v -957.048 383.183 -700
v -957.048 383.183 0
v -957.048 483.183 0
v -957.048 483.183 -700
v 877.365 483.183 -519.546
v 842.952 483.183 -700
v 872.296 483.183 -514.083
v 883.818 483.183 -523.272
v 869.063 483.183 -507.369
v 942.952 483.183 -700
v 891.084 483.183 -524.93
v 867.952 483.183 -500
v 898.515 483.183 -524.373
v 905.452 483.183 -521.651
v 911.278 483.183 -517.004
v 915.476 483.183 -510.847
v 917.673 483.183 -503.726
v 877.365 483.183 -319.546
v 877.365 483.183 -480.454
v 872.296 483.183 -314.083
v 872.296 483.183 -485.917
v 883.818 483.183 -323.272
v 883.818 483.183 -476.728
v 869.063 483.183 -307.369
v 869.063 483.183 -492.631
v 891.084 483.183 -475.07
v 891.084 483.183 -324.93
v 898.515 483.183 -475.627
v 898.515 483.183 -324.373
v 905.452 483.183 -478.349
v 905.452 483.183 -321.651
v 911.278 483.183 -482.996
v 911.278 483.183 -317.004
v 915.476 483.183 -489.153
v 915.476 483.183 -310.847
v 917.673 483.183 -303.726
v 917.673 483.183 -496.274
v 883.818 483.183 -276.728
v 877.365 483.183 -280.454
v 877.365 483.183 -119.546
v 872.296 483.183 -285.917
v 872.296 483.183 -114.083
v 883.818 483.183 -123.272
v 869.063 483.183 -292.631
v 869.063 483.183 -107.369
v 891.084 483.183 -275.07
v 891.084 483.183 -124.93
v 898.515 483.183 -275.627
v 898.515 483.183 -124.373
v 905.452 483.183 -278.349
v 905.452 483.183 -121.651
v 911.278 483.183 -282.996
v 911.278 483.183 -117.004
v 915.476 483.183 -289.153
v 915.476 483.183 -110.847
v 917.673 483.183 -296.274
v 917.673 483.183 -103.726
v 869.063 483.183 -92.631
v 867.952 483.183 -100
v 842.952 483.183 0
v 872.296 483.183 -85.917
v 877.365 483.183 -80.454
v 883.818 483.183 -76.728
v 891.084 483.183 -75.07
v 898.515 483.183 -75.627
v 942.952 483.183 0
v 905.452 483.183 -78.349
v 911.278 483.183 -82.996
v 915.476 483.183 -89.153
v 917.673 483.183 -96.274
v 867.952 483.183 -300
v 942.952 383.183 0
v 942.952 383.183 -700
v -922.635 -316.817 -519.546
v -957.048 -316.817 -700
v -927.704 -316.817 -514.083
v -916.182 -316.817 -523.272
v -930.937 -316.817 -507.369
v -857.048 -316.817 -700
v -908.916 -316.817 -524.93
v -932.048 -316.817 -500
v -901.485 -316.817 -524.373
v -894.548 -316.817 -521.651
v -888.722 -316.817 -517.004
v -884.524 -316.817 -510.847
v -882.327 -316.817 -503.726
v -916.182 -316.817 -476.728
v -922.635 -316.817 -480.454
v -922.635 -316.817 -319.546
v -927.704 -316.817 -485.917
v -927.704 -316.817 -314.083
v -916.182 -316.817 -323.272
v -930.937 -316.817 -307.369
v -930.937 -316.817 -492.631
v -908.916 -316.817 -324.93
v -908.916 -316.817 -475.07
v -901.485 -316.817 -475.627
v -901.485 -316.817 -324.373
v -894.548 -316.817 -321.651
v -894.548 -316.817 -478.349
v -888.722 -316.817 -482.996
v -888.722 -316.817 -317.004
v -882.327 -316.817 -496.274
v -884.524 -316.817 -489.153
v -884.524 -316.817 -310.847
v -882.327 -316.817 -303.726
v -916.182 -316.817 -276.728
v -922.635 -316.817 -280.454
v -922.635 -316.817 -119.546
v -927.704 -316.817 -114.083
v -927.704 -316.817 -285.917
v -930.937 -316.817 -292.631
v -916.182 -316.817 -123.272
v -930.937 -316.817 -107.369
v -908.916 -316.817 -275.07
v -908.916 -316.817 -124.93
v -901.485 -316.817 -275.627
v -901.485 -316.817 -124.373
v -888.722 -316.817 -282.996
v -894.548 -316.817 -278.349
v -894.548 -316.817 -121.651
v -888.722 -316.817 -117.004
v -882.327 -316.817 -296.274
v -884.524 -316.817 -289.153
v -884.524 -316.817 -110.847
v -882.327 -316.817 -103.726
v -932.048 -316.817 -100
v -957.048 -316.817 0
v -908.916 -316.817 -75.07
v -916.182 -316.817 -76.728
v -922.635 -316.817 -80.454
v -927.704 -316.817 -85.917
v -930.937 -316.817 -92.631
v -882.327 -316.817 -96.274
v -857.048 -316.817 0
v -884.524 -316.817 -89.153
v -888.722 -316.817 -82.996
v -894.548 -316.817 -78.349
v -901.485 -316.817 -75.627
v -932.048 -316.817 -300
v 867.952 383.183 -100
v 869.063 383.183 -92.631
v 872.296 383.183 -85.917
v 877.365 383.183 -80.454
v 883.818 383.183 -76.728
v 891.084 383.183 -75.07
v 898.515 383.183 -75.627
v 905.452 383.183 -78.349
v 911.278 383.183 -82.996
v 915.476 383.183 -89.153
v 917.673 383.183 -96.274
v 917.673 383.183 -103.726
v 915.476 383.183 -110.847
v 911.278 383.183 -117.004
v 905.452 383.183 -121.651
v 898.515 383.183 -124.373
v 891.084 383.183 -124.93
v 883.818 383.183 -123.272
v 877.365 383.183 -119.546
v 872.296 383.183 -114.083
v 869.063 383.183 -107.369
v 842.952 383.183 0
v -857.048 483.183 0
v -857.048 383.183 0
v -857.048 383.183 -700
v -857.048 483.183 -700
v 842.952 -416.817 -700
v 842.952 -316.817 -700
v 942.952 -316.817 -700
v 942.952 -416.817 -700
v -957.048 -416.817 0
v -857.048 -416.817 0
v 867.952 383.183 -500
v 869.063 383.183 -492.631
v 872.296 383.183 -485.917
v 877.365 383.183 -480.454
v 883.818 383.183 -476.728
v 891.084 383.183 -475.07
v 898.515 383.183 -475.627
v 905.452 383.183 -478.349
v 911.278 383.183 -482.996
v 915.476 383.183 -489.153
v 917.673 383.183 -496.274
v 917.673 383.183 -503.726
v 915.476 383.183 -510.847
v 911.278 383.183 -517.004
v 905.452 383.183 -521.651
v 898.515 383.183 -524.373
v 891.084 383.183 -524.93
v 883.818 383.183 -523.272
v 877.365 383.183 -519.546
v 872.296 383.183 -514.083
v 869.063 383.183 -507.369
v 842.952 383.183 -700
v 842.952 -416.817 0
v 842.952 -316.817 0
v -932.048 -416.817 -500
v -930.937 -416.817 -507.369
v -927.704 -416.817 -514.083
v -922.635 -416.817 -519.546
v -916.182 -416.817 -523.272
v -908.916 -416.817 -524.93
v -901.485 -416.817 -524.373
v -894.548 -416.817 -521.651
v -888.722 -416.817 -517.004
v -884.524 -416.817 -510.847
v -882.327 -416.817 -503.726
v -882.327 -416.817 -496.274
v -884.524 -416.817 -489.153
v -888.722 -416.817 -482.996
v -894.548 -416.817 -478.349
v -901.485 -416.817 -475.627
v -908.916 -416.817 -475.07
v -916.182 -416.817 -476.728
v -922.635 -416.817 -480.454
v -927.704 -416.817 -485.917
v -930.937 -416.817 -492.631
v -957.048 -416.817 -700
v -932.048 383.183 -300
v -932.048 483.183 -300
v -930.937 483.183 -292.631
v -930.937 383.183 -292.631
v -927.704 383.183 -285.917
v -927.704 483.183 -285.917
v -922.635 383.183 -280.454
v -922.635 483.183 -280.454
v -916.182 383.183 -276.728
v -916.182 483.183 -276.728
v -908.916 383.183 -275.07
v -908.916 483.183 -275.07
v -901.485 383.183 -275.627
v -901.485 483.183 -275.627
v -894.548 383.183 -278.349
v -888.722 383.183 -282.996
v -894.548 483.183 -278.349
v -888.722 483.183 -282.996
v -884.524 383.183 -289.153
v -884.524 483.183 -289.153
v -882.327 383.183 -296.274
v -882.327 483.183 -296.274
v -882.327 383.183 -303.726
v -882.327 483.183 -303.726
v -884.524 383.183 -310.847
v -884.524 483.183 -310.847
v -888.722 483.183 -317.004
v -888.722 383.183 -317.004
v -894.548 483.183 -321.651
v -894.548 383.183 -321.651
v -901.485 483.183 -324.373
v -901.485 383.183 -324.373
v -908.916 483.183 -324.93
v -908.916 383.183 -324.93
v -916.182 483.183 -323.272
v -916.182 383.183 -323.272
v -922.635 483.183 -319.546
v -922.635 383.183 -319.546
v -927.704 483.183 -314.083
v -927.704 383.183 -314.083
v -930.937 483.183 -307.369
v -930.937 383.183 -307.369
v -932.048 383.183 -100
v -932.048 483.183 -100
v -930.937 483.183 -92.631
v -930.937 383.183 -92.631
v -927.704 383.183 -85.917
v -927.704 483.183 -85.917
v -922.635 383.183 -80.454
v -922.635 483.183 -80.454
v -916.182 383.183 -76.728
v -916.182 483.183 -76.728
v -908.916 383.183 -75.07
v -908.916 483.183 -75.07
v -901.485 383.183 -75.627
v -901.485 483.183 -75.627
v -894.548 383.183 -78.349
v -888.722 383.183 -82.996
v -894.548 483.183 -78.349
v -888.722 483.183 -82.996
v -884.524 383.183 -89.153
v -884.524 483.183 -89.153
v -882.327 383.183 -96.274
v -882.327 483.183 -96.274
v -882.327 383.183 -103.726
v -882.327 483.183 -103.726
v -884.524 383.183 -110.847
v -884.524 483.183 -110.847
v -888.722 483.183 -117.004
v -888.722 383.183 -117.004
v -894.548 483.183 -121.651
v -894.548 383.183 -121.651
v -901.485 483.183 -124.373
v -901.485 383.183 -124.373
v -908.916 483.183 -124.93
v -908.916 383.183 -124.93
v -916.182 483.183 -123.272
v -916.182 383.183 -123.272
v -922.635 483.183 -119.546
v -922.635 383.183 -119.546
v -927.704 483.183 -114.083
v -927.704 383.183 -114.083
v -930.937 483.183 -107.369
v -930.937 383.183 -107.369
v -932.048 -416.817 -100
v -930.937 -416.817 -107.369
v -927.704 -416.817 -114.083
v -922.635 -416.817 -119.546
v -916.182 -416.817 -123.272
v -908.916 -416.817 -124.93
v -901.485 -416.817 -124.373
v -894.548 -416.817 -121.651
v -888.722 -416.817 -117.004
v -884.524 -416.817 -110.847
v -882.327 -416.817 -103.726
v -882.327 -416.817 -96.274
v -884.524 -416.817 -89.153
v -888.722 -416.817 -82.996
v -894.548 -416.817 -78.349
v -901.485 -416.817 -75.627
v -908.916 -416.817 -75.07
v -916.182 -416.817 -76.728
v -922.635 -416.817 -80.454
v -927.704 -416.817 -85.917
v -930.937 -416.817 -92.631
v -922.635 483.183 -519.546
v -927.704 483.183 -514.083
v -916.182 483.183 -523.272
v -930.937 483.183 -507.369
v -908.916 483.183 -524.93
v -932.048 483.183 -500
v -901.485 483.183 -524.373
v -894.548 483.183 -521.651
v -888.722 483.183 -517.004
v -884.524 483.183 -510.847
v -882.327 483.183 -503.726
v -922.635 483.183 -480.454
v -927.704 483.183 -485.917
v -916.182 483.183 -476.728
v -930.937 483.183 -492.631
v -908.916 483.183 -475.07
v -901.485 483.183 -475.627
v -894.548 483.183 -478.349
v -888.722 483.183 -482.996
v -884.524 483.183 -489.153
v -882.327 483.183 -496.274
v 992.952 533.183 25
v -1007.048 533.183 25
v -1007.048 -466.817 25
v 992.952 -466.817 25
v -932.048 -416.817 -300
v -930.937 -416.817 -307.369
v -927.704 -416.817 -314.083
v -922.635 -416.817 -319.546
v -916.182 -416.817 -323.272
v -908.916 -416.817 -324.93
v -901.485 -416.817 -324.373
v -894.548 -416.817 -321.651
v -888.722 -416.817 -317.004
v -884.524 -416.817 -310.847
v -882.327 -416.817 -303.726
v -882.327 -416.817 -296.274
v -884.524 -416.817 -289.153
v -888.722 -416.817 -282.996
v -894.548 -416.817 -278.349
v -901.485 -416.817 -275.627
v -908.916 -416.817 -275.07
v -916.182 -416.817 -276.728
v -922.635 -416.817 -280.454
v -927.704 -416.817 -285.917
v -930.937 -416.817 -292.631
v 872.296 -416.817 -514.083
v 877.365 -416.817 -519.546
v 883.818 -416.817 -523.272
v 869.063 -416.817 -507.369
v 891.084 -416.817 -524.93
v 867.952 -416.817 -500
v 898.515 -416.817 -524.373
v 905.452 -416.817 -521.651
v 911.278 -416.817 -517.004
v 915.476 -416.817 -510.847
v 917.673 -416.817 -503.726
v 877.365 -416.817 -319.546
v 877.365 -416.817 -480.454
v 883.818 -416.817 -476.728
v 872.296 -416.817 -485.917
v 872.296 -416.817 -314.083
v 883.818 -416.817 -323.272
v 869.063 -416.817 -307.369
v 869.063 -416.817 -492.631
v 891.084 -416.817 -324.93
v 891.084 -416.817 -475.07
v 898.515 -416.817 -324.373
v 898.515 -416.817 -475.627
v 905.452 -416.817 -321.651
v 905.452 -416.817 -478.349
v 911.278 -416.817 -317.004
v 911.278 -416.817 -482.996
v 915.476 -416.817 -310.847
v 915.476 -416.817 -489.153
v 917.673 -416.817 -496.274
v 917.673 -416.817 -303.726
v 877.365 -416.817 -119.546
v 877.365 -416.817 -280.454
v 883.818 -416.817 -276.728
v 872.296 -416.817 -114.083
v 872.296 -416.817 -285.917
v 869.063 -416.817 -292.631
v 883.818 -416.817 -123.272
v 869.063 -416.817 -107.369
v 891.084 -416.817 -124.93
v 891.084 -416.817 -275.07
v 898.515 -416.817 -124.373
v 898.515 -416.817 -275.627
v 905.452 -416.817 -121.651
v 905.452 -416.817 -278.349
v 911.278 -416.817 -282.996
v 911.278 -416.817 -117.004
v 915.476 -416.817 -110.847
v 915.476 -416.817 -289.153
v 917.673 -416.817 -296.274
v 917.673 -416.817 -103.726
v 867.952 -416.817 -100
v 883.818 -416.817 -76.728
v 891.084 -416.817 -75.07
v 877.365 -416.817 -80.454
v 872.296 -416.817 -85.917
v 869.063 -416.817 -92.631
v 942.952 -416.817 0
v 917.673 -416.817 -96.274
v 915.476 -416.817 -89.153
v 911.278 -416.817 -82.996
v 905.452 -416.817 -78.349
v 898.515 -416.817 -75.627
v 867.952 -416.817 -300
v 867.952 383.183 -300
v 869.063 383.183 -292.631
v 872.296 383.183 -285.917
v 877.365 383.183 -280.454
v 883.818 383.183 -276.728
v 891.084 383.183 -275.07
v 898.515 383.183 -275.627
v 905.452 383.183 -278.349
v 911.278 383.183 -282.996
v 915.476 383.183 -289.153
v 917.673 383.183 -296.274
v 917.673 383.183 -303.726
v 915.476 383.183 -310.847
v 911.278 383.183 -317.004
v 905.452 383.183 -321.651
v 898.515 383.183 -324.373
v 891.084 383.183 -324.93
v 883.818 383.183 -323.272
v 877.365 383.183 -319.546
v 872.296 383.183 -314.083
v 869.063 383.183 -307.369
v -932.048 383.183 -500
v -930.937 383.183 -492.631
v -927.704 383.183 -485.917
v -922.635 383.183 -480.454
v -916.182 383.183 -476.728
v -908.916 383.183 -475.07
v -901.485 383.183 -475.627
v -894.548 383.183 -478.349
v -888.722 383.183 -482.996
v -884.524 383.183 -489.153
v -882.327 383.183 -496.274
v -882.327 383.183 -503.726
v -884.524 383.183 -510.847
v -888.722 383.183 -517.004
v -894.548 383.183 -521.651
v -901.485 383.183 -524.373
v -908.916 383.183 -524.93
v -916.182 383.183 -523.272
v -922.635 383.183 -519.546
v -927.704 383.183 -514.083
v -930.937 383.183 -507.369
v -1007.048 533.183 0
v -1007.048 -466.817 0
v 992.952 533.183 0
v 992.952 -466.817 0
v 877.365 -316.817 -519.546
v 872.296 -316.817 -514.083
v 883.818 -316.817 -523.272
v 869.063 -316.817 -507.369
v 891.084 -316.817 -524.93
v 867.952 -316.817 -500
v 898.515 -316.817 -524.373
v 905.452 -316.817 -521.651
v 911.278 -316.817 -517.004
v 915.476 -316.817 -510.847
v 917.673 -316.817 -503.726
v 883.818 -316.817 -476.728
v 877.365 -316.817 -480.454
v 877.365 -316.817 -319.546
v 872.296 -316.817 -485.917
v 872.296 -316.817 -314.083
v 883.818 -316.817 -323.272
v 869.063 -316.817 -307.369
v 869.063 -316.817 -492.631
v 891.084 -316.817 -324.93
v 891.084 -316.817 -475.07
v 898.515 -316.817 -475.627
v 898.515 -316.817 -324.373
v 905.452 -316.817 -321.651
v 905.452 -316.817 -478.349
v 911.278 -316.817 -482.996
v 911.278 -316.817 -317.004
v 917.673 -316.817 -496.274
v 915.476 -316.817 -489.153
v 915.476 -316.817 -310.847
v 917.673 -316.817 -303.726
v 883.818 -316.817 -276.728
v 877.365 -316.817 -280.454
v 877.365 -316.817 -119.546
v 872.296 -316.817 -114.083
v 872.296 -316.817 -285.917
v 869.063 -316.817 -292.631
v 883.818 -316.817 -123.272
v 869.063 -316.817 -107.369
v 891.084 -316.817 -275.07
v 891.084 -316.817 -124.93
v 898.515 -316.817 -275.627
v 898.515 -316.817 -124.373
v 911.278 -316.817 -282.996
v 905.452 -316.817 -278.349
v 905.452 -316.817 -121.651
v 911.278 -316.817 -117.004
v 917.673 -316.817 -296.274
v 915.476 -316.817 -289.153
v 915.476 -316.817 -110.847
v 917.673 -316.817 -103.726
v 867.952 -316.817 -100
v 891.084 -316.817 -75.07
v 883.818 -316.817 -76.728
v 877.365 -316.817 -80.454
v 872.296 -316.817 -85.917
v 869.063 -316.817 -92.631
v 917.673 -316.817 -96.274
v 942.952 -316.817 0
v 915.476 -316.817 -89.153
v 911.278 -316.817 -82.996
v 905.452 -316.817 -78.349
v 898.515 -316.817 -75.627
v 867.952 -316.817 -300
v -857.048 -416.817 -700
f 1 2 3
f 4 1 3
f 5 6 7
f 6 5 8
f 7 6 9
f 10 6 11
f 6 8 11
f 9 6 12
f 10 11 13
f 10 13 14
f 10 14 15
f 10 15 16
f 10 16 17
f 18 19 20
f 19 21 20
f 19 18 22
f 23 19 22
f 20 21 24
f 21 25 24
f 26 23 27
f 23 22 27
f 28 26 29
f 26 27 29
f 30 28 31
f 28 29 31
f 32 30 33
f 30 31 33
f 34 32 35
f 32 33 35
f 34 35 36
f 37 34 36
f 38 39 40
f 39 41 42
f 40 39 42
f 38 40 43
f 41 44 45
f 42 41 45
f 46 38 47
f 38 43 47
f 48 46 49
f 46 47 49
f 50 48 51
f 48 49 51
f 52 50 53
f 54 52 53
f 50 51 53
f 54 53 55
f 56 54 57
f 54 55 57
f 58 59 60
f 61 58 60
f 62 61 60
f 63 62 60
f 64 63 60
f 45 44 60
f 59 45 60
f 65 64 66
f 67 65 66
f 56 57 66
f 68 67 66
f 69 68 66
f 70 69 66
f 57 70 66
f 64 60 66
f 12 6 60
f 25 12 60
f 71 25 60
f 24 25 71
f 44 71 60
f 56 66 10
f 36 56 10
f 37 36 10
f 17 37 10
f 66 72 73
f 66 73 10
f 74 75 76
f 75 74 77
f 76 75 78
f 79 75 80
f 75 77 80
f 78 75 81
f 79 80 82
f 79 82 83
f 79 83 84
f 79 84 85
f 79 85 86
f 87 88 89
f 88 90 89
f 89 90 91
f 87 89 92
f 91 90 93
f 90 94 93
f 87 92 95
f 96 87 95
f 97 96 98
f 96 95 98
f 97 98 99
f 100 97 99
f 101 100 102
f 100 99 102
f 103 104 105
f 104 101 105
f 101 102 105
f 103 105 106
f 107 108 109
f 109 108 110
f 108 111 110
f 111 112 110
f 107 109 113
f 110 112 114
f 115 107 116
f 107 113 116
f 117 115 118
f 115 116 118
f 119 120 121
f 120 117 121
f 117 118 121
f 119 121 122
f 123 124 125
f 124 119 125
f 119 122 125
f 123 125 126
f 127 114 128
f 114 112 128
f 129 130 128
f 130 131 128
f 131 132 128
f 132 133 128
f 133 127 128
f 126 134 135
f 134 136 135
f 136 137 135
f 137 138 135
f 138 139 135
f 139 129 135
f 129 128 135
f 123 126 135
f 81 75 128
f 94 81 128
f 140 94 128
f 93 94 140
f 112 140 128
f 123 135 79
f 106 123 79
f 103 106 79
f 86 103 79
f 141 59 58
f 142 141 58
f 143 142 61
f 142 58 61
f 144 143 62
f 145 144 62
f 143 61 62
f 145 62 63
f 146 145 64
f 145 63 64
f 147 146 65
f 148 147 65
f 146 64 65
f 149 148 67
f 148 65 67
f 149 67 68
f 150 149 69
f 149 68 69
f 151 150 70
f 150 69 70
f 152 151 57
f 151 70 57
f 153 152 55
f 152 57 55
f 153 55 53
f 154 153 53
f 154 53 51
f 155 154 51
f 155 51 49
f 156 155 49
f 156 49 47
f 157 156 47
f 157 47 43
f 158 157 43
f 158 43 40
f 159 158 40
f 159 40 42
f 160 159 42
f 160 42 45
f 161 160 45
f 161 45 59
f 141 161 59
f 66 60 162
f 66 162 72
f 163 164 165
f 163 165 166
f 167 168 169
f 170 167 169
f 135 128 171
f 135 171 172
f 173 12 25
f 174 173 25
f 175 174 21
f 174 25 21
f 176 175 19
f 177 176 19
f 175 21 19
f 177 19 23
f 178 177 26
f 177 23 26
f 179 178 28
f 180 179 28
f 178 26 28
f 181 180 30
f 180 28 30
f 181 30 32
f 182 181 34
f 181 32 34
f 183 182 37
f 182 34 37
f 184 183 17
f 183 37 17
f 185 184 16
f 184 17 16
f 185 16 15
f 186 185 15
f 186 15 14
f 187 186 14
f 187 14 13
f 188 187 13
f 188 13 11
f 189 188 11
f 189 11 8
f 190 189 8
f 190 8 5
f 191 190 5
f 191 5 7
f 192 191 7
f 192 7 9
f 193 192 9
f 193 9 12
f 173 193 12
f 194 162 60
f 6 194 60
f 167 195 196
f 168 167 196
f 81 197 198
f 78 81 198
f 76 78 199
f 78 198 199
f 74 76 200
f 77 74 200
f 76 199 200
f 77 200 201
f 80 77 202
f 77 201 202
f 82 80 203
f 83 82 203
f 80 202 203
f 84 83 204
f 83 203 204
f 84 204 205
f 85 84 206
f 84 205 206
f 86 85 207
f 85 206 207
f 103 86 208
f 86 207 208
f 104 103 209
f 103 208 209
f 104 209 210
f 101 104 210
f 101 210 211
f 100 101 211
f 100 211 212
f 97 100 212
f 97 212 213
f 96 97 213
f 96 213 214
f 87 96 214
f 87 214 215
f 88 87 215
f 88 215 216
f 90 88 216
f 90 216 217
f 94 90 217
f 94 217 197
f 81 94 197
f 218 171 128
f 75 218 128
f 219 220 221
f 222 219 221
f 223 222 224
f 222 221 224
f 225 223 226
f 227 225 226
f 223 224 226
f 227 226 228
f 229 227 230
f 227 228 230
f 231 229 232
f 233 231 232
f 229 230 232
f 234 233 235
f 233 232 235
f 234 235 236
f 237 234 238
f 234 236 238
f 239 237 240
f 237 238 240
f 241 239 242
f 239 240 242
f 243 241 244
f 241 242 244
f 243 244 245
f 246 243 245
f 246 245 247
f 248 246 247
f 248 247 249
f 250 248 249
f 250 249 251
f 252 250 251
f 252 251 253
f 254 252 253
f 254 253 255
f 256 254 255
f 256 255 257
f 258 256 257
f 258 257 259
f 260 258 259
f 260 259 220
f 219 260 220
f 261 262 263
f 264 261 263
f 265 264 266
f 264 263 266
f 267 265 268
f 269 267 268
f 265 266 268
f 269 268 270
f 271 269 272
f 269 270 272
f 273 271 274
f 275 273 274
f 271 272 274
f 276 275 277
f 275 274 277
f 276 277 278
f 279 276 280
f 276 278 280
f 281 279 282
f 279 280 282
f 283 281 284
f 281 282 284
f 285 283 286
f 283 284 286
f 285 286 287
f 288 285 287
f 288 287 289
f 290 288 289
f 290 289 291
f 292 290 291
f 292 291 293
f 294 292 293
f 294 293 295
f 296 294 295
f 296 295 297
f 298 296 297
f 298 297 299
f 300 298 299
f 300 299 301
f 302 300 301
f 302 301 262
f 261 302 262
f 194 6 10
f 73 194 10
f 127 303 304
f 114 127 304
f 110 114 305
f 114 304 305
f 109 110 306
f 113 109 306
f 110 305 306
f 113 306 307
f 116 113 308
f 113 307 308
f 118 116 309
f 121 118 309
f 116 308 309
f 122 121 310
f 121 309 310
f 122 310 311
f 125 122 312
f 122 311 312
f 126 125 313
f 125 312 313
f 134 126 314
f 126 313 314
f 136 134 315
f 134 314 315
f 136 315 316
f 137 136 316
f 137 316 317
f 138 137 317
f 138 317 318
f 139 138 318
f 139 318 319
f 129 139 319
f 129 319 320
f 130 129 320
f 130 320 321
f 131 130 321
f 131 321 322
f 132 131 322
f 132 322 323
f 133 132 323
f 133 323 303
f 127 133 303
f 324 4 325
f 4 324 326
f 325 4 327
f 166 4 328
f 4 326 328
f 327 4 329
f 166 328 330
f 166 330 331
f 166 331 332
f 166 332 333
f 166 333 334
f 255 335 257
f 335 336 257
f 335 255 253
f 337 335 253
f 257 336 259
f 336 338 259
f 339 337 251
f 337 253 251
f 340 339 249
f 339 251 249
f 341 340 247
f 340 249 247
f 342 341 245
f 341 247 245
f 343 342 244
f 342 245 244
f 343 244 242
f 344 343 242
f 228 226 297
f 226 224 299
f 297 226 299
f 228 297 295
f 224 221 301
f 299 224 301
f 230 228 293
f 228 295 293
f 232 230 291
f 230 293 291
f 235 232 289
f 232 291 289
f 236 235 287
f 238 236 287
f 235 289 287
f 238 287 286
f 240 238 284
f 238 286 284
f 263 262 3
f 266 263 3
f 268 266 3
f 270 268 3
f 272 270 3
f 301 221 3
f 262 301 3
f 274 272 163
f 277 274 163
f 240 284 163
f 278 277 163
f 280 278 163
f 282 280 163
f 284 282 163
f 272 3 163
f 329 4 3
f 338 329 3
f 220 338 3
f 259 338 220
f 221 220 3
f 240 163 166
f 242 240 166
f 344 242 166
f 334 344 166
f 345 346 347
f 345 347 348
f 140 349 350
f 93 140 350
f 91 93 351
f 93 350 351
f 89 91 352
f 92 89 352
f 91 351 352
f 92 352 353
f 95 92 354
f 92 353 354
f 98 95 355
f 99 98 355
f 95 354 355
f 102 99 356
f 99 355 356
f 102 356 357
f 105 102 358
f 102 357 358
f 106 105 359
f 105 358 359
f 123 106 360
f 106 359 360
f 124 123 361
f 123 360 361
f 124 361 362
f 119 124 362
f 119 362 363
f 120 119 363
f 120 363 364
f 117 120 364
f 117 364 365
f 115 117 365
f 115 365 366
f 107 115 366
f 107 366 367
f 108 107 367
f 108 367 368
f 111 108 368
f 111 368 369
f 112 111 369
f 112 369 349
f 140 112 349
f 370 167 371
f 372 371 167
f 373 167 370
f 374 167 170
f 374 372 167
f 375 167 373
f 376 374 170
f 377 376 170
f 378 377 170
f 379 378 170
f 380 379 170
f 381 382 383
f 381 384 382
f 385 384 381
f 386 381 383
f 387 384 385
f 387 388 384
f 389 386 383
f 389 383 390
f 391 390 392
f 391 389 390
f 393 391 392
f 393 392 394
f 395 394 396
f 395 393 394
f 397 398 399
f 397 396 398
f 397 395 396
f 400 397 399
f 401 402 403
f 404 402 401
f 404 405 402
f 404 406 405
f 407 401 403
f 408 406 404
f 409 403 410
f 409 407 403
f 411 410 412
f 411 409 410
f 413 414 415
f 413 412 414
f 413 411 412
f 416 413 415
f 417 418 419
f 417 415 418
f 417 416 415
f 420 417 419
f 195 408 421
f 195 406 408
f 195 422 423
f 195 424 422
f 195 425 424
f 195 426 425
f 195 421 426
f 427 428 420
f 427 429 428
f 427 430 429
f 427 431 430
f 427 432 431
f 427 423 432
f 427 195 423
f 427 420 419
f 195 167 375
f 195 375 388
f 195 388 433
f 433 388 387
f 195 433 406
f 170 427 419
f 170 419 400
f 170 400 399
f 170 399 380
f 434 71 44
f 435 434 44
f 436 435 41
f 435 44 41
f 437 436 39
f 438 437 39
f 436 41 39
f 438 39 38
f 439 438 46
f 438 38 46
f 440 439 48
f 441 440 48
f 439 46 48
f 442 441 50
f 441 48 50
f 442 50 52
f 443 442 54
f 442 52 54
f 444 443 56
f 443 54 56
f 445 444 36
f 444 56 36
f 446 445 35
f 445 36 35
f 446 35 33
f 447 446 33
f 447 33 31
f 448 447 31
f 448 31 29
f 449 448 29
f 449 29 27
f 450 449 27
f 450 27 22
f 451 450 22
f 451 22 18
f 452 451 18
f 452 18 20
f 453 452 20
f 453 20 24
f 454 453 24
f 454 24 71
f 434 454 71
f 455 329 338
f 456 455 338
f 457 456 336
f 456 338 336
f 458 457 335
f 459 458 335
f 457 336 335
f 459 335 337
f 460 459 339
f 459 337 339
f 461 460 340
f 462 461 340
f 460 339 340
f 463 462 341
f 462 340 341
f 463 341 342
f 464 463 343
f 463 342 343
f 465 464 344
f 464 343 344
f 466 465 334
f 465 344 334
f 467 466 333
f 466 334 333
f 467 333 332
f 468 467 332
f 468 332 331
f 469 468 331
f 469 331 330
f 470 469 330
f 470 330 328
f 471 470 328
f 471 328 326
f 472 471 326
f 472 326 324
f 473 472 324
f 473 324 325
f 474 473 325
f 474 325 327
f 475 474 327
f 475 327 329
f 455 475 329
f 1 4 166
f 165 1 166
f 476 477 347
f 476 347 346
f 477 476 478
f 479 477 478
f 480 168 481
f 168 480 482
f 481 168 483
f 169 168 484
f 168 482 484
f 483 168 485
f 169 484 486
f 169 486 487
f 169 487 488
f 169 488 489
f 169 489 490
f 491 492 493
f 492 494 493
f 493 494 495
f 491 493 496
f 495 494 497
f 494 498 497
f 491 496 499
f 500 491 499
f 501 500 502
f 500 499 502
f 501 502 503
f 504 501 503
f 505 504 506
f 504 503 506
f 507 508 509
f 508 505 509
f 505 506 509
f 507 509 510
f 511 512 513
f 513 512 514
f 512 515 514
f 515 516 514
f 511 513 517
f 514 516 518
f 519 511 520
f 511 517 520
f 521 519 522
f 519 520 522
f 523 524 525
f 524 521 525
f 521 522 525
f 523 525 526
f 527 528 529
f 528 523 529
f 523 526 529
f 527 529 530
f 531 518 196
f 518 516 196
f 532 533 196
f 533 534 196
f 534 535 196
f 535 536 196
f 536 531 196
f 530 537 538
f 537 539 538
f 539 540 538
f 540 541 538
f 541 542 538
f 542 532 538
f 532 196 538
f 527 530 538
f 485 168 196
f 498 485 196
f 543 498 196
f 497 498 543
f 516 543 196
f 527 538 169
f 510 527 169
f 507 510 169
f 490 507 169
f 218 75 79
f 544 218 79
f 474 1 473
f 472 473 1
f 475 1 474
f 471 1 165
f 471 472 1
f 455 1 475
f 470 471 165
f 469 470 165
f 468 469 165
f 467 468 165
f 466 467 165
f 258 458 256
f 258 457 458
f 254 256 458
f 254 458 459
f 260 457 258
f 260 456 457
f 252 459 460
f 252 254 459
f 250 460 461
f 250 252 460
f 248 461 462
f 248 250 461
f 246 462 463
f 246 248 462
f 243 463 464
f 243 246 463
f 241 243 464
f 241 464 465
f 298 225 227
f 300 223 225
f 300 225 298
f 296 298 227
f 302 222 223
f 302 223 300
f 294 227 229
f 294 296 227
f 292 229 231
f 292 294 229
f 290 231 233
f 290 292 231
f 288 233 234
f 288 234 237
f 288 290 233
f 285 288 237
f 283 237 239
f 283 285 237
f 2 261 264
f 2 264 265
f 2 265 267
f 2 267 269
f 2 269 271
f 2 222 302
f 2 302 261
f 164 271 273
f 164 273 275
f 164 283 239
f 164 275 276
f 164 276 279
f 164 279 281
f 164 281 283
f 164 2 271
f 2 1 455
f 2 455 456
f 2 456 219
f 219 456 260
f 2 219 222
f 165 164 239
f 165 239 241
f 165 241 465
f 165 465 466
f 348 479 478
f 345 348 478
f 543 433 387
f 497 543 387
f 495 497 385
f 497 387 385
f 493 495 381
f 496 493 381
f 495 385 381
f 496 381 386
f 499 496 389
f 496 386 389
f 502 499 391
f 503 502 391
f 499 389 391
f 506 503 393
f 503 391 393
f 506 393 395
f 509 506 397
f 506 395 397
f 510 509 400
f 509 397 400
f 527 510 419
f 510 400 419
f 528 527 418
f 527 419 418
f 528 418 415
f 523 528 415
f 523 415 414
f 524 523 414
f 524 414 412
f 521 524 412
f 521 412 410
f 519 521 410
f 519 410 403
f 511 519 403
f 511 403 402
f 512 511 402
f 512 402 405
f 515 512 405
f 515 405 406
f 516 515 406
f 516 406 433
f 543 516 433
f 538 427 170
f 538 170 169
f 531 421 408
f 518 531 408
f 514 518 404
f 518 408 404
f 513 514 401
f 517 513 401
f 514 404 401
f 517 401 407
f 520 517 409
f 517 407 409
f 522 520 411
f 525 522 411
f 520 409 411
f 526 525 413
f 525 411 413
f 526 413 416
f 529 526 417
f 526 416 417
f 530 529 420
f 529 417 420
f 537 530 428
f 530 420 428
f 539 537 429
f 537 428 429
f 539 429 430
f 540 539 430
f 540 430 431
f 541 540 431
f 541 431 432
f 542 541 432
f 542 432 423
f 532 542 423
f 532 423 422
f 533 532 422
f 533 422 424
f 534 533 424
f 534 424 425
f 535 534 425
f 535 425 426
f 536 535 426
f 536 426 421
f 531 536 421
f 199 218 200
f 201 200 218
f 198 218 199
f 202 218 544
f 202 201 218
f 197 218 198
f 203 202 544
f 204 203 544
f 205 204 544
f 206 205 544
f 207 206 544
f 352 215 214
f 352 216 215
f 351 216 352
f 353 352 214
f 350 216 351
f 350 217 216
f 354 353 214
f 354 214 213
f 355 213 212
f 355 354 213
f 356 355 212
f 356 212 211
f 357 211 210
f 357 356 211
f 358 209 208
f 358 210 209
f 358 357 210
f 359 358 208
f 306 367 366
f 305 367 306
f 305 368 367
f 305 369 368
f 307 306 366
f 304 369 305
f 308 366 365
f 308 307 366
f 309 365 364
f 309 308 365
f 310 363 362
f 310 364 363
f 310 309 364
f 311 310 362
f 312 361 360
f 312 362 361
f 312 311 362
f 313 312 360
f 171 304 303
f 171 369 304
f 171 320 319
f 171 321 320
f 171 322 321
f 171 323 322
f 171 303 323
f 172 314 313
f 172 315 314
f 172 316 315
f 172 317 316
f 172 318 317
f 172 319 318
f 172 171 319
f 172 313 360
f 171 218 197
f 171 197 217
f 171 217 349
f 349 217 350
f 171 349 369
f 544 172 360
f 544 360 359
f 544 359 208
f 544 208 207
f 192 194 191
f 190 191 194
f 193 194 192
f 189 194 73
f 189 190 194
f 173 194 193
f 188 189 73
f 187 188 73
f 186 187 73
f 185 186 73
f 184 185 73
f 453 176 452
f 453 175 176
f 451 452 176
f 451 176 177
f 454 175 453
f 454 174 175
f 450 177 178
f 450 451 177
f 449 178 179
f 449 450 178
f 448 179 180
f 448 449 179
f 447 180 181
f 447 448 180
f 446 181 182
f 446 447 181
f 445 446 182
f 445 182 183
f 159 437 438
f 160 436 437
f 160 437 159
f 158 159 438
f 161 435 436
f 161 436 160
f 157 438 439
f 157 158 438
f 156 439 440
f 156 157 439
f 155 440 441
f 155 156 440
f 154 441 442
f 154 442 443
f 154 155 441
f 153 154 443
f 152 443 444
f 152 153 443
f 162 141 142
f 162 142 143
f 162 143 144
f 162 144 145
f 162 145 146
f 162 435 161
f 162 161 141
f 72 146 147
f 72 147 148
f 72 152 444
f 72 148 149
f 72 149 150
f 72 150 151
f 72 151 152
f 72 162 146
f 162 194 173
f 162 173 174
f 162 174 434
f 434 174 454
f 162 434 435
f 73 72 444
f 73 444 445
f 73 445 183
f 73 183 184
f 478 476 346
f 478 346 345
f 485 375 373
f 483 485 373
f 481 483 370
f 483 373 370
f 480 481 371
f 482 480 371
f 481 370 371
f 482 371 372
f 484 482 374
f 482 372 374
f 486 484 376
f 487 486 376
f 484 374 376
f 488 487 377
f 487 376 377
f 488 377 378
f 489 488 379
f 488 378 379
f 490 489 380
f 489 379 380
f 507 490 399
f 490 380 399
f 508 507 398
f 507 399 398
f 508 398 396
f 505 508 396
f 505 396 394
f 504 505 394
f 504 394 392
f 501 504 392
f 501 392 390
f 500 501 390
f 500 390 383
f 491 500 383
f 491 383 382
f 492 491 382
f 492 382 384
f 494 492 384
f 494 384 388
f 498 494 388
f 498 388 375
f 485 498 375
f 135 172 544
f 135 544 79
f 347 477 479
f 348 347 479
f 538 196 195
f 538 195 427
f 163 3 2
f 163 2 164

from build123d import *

# Parameters (mm, degrees)
F0_W     = 2000
F0_H     = 1000
F0_W_2   = 100
F0_H_2   = 100
F1_DEPTH = 25
F2_DEPTH = 700
F4_D     = 50
F5_D     = 50
F6_D     = 50
F7_D     = 50


with BuildPart() as f1:
    # F0 (on Top) → F1 (new body)
    with BuildSketch(Plane.XY):
        with Locations((-7.0481244475, 33.1831849229)):
            Rectangle(F0_W, F0_H)
        with Locations((-907.0481244475, -366.8168150771)):
            Rectangle(F0_W_2, F0_H_2, mode=Mode.SUBTRACT)
        with Locations((892.9518755525, -366.8168150771)):
            Rectangle(F0_W_2, F0_H_2, mode=Mode.SUBTRACT)
        with Locations((-907.0481244475, 433.1831849229)):
            Rectangle(F0_W_2, F0_H_2, mode=Mode.SUBTRACT)
        with Locations((892.9518755525, 433.1831849229)):
            Rectangle(F0_W_2, F0_H_2, mode=Mode.SUBTRACT)
        with Locations((-907.0481244475, 433.1831849229)):
            Rectangle(F0_W_2, F0_H_2)
        with Locations((-907.0481244475, -366.8168150771)):
            Rectangle(F0_W_2, F0_H_2)
        with Locations((892.9518755525, 433.1831849229)):
            Rectangle(F0_W_2, F0_H_2)
        with Locations((892.9518755525, -366.8168150771)):
            Rectangle(F0_W_2, F0_H_2)
    extrude(amount=F1_DEPTH)


with BuildPart() as f2:
    # F0 (on Top) → F2 (new body)
    with BuildSketch(Plane.XY):
        with Locations((-907.0481244475, -366.8168150771)):
            Rectangle(F0_W_2, F0_H_2)
    extrude(amount=-F2_DEPTH)

    # F4 (through all)
    with Locations(Plane(origin=(0, 0, 0), x_dir=(1, 0, 0), z_dir=(0, 1, 0))):
        with Locations((-907.0481244475, 100), (-907.0481244475, 300), (-907.0481244475, 500)):
            Hole(F4_D / 2)


with BuildPart() as f2b:
    # F0 (on Top) → F2, piece 2 (new body)
    with BuildSketch(Plane.XY):
        with Locations((-907.0481244475, 433.1831849229)):
            Rectangle(F0_W_2, F0_H_2)
    extrude(amount=-F2_DEPTH)

    # F5 (through all)
    with Locations(Plane.XZ):
        with Locations((-907.0481244475, -100), (-907.0481244475, -300), (-907.0481244475, -500)):
            Hole(F5_D / 2)


with BuildPart() as f2c:
    # F0 (on Top) → F2, piece 3 (new body)
    with BuildSketch(Plane.XY):
        with Locations((892.9518755525, -366.8168150771)):
            Rectangle(F0_W_2, F0_H_2)
    extrude(amount=-F2_DEPTH)

    # F6 (through all)
    with Locations(Plane(origin=(0, 0, 0), x_dir=(1, 0, 0), z_dir=(0, 1, 0))):
        with Locations((892.9518755525, 100), (892.9518755525, 300), (892.9518755525, 500)):
            Hole(F6_D / 2)


with BuildPart() as f2d:
    # F0 (on Top) → F2, piece 4 (new body)
    with BuildSketch(Plane.XY):
        with Locations((892.9518755525, 433.1831849229)):
            Rectangle(F0_W_2, F0_H_2)
    extrude(amount=-F2_DEPTH)

    # F7 (through all)
    with Locations(Plane.XZ):
        with Locations((892.9518755525, -100), (892.9518755525, -300), (892.9518755525, -500)):
            Hole(F7_D / 2)


solid = Compound([f1.part, f2.part, f2b.part, f2c.part, f2d.part])
